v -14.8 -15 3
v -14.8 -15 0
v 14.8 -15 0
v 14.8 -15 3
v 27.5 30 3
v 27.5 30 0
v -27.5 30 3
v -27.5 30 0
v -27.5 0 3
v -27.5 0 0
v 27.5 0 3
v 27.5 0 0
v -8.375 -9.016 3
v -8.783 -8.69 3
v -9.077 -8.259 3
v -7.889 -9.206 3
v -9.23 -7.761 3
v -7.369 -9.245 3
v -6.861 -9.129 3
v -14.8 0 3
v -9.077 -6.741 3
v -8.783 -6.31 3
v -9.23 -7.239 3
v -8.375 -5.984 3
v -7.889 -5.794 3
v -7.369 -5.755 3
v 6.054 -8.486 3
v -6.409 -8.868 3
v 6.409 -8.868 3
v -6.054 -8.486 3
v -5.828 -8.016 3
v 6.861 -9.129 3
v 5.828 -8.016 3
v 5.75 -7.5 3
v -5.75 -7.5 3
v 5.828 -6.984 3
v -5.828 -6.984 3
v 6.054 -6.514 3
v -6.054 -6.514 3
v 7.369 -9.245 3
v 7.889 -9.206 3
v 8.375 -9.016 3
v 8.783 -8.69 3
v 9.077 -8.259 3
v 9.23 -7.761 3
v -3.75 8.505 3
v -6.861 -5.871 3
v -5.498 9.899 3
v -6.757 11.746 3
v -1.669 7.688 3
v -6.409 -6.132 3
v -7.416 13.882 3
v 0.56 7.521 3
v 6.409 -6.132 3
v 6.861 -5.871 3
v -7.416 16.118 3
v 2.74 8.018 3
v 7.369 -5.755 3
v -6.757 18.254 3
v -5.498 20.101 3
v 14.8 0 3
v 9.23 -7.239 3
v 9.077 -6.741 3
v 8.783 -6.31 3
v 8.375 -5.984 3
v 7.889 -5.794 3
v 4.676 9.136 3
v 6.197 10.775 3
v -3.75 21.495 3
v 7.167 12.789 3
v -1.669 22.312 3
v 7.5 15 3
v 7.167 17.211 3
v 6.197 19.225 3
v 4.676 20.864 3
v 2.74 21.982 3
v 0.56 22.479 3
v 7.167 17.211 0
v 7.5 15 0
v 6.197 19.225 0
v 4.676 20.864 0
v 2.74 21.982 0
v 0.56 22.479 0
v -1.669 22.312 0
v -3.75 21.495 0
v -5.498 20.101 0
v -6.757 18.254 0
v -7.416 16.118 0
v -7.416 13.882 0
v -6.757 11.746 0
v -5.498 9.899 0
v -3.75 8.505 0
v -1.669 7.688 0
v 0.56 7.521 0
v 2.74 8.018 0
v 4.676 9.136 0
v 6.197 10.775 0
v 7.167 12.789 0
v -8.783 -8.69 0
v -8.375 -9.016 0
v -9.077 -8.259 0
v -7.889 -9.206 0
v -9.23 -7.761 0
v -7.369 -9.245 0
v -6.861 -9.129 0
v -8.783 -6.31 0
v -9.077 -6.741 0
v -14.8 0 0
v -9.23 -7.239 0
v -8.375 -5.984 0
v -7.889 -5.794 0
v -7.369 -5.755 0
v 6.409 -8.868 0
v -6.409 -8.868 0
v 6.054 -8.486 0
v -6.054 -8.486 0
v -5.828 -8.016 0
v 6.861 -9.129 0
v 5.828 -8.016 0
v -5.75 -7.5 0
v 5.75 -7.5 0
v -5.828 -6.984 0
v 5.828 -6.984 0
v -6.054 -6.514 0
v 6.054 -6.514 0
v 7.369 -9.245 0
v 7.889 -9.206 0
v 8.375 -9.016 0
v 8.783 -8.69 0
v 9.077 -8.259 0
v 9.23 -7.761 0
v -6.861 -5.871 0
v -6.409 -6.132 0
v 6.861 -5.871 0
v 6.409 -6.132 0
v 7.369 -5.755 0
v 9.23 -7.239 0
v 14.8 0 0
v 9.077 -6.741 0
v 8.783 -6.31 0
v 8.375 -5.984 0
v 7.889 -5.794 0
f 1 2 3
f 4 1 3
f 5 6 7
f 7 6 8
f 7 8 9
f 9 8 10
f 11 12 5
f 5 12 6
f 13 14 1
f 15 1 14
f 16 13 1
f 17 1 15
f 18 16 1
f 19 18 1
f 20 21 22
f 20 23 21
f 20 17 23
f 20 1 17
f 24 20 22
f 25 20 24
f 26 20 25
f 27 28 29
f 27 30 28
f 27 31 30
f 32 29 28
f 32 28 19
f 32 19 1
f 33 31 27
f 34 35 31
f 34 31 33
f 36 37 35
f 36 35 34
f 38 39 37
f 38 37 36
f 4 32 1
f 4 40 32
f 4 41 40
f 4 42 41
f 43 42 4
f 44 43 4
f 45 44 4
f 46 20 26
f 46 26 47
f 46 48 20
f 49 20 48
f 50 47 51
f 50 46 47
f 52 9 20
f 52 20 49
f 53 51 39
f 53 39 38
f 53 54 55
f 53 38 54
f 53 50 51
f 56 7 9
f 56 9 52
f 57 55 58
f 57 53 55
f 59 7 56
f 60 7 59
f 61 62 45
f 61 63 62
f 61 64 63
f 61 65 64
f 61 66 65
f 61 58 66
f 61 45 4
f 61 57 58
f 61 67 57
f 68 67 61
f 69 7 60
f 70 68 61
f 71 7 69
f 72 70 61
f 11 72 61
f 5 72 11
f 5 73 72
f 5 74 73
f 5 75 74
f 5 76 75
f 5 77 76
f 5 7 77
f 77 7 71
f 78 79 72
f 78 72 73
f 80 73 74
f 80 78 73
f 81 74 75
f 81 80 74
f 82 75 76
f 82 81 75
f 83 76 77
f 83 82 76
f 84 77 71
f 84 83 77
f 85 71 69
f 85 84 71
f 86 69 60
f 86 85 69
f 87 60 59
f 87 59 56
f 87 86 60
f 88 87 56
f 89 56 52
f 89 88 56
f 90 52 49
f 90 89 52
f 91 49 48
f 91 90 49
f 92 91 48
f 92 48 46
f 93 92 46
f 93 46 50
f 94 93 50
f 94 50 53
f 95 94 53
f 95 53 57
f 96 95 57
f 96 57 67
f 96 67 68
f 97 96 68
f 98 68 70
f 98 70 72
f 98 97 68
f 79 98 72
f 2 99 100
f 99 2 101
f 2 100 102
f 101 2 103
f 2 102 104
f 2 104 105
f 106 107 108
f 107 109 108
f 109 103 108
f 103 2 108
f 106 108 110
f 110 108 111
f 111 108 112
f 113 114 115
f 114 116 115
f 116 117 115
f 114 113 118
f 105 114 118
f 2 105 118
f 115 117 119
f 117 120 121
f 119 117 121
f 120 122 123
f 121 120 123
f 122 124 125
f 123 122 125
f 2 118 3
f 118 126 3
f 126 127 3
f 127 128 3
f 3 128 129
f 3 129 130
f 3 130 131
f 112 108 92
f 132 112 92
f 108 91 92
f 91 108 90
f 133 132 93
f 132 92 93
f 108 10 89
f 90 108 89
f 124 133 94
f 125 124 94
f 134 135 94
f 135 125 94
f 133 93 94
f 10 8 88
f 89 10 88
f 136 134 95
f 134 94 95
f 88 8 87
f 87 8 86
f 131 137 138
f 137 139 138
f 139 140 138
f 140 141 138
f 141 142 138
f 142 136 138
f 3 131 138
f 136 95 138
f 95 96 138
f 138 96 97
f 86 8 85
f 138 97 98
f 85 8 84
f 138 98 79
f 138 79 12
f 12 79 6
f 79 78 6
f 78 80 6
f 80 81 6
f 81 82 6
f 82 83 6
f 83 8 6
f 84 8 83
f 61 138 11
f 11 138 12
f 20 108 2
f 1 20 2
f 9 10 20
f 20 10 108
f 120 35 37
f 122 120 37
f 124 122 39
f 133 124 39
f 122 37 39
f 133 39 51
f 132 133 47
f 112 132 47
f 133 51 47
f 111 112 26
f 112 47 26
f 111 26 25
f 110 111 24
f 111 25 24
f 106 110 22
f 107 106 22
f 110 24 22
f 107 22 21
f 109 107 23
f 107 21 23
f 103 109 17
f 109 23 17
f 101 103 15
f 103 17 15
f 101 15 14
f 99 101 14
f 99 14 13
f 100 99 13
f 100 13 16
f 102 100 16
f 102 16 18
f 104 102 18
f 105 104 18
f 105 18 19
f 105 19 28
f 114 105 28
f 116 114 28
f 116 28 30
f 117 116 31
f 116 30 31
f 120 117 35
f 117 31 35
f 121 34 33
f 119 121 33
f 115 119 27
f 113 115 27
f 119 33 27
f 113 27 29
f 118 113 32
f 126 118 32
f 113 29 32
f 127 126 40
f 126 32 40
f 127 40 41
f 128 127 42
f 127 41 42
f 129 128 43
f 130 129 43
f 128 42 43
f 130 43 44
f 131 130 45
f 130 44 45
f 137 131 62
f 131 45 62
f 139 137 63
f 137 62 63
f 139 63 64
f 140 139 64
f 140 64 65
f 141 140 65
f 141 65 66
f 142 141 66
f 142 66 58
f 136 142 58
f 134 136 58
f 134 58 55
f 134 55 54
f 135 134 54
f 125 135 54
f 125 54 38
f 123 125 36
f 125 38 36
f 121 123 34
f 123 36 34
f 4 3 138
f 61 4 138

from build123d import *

# Parameters (mm, degrees)
SKETCH_1_R          = 7.5
EXTRUDE_1_DEPTH     = 3
SKETCH_2_R          = 1.75
CUT_EXTRUDE_1_DEPTH = 3


with BuildPart() as part:
    # 草图1 → 凸台-拉伸1 (new body)
    with BuildSketch(Plane.XY):
        Polygon((-14.8, -15), (14.8, -15), (14.8, 0), (27.5, 0), (27.5, 30), (-27.5, 30), (-27.5, 0), (-14.8, 0), align=None)
        with Locations((0, 15)):
            Circle(SKETCH_1_R, mode=Mode.SUBTRACT)
    extrude(amount=EXTRUDE_1_DEPTH)

    # 草图2 → 切除-拉伸1 (cut)
    with BuildSketch(Plane.XY.offset(3)):
        with Locations((-7.5, -7.5)):
            Circle(SKETCH_2_R)
        with Locations(Location((7.5, -7.5, 0), (0, 0, 180))):
            Circle(SKETCH_2_R)
    extrude(amount=-CUT_EXTRUDE_1_DEPTH, mode=Mode.SUBTRACT)


solid = part.part
